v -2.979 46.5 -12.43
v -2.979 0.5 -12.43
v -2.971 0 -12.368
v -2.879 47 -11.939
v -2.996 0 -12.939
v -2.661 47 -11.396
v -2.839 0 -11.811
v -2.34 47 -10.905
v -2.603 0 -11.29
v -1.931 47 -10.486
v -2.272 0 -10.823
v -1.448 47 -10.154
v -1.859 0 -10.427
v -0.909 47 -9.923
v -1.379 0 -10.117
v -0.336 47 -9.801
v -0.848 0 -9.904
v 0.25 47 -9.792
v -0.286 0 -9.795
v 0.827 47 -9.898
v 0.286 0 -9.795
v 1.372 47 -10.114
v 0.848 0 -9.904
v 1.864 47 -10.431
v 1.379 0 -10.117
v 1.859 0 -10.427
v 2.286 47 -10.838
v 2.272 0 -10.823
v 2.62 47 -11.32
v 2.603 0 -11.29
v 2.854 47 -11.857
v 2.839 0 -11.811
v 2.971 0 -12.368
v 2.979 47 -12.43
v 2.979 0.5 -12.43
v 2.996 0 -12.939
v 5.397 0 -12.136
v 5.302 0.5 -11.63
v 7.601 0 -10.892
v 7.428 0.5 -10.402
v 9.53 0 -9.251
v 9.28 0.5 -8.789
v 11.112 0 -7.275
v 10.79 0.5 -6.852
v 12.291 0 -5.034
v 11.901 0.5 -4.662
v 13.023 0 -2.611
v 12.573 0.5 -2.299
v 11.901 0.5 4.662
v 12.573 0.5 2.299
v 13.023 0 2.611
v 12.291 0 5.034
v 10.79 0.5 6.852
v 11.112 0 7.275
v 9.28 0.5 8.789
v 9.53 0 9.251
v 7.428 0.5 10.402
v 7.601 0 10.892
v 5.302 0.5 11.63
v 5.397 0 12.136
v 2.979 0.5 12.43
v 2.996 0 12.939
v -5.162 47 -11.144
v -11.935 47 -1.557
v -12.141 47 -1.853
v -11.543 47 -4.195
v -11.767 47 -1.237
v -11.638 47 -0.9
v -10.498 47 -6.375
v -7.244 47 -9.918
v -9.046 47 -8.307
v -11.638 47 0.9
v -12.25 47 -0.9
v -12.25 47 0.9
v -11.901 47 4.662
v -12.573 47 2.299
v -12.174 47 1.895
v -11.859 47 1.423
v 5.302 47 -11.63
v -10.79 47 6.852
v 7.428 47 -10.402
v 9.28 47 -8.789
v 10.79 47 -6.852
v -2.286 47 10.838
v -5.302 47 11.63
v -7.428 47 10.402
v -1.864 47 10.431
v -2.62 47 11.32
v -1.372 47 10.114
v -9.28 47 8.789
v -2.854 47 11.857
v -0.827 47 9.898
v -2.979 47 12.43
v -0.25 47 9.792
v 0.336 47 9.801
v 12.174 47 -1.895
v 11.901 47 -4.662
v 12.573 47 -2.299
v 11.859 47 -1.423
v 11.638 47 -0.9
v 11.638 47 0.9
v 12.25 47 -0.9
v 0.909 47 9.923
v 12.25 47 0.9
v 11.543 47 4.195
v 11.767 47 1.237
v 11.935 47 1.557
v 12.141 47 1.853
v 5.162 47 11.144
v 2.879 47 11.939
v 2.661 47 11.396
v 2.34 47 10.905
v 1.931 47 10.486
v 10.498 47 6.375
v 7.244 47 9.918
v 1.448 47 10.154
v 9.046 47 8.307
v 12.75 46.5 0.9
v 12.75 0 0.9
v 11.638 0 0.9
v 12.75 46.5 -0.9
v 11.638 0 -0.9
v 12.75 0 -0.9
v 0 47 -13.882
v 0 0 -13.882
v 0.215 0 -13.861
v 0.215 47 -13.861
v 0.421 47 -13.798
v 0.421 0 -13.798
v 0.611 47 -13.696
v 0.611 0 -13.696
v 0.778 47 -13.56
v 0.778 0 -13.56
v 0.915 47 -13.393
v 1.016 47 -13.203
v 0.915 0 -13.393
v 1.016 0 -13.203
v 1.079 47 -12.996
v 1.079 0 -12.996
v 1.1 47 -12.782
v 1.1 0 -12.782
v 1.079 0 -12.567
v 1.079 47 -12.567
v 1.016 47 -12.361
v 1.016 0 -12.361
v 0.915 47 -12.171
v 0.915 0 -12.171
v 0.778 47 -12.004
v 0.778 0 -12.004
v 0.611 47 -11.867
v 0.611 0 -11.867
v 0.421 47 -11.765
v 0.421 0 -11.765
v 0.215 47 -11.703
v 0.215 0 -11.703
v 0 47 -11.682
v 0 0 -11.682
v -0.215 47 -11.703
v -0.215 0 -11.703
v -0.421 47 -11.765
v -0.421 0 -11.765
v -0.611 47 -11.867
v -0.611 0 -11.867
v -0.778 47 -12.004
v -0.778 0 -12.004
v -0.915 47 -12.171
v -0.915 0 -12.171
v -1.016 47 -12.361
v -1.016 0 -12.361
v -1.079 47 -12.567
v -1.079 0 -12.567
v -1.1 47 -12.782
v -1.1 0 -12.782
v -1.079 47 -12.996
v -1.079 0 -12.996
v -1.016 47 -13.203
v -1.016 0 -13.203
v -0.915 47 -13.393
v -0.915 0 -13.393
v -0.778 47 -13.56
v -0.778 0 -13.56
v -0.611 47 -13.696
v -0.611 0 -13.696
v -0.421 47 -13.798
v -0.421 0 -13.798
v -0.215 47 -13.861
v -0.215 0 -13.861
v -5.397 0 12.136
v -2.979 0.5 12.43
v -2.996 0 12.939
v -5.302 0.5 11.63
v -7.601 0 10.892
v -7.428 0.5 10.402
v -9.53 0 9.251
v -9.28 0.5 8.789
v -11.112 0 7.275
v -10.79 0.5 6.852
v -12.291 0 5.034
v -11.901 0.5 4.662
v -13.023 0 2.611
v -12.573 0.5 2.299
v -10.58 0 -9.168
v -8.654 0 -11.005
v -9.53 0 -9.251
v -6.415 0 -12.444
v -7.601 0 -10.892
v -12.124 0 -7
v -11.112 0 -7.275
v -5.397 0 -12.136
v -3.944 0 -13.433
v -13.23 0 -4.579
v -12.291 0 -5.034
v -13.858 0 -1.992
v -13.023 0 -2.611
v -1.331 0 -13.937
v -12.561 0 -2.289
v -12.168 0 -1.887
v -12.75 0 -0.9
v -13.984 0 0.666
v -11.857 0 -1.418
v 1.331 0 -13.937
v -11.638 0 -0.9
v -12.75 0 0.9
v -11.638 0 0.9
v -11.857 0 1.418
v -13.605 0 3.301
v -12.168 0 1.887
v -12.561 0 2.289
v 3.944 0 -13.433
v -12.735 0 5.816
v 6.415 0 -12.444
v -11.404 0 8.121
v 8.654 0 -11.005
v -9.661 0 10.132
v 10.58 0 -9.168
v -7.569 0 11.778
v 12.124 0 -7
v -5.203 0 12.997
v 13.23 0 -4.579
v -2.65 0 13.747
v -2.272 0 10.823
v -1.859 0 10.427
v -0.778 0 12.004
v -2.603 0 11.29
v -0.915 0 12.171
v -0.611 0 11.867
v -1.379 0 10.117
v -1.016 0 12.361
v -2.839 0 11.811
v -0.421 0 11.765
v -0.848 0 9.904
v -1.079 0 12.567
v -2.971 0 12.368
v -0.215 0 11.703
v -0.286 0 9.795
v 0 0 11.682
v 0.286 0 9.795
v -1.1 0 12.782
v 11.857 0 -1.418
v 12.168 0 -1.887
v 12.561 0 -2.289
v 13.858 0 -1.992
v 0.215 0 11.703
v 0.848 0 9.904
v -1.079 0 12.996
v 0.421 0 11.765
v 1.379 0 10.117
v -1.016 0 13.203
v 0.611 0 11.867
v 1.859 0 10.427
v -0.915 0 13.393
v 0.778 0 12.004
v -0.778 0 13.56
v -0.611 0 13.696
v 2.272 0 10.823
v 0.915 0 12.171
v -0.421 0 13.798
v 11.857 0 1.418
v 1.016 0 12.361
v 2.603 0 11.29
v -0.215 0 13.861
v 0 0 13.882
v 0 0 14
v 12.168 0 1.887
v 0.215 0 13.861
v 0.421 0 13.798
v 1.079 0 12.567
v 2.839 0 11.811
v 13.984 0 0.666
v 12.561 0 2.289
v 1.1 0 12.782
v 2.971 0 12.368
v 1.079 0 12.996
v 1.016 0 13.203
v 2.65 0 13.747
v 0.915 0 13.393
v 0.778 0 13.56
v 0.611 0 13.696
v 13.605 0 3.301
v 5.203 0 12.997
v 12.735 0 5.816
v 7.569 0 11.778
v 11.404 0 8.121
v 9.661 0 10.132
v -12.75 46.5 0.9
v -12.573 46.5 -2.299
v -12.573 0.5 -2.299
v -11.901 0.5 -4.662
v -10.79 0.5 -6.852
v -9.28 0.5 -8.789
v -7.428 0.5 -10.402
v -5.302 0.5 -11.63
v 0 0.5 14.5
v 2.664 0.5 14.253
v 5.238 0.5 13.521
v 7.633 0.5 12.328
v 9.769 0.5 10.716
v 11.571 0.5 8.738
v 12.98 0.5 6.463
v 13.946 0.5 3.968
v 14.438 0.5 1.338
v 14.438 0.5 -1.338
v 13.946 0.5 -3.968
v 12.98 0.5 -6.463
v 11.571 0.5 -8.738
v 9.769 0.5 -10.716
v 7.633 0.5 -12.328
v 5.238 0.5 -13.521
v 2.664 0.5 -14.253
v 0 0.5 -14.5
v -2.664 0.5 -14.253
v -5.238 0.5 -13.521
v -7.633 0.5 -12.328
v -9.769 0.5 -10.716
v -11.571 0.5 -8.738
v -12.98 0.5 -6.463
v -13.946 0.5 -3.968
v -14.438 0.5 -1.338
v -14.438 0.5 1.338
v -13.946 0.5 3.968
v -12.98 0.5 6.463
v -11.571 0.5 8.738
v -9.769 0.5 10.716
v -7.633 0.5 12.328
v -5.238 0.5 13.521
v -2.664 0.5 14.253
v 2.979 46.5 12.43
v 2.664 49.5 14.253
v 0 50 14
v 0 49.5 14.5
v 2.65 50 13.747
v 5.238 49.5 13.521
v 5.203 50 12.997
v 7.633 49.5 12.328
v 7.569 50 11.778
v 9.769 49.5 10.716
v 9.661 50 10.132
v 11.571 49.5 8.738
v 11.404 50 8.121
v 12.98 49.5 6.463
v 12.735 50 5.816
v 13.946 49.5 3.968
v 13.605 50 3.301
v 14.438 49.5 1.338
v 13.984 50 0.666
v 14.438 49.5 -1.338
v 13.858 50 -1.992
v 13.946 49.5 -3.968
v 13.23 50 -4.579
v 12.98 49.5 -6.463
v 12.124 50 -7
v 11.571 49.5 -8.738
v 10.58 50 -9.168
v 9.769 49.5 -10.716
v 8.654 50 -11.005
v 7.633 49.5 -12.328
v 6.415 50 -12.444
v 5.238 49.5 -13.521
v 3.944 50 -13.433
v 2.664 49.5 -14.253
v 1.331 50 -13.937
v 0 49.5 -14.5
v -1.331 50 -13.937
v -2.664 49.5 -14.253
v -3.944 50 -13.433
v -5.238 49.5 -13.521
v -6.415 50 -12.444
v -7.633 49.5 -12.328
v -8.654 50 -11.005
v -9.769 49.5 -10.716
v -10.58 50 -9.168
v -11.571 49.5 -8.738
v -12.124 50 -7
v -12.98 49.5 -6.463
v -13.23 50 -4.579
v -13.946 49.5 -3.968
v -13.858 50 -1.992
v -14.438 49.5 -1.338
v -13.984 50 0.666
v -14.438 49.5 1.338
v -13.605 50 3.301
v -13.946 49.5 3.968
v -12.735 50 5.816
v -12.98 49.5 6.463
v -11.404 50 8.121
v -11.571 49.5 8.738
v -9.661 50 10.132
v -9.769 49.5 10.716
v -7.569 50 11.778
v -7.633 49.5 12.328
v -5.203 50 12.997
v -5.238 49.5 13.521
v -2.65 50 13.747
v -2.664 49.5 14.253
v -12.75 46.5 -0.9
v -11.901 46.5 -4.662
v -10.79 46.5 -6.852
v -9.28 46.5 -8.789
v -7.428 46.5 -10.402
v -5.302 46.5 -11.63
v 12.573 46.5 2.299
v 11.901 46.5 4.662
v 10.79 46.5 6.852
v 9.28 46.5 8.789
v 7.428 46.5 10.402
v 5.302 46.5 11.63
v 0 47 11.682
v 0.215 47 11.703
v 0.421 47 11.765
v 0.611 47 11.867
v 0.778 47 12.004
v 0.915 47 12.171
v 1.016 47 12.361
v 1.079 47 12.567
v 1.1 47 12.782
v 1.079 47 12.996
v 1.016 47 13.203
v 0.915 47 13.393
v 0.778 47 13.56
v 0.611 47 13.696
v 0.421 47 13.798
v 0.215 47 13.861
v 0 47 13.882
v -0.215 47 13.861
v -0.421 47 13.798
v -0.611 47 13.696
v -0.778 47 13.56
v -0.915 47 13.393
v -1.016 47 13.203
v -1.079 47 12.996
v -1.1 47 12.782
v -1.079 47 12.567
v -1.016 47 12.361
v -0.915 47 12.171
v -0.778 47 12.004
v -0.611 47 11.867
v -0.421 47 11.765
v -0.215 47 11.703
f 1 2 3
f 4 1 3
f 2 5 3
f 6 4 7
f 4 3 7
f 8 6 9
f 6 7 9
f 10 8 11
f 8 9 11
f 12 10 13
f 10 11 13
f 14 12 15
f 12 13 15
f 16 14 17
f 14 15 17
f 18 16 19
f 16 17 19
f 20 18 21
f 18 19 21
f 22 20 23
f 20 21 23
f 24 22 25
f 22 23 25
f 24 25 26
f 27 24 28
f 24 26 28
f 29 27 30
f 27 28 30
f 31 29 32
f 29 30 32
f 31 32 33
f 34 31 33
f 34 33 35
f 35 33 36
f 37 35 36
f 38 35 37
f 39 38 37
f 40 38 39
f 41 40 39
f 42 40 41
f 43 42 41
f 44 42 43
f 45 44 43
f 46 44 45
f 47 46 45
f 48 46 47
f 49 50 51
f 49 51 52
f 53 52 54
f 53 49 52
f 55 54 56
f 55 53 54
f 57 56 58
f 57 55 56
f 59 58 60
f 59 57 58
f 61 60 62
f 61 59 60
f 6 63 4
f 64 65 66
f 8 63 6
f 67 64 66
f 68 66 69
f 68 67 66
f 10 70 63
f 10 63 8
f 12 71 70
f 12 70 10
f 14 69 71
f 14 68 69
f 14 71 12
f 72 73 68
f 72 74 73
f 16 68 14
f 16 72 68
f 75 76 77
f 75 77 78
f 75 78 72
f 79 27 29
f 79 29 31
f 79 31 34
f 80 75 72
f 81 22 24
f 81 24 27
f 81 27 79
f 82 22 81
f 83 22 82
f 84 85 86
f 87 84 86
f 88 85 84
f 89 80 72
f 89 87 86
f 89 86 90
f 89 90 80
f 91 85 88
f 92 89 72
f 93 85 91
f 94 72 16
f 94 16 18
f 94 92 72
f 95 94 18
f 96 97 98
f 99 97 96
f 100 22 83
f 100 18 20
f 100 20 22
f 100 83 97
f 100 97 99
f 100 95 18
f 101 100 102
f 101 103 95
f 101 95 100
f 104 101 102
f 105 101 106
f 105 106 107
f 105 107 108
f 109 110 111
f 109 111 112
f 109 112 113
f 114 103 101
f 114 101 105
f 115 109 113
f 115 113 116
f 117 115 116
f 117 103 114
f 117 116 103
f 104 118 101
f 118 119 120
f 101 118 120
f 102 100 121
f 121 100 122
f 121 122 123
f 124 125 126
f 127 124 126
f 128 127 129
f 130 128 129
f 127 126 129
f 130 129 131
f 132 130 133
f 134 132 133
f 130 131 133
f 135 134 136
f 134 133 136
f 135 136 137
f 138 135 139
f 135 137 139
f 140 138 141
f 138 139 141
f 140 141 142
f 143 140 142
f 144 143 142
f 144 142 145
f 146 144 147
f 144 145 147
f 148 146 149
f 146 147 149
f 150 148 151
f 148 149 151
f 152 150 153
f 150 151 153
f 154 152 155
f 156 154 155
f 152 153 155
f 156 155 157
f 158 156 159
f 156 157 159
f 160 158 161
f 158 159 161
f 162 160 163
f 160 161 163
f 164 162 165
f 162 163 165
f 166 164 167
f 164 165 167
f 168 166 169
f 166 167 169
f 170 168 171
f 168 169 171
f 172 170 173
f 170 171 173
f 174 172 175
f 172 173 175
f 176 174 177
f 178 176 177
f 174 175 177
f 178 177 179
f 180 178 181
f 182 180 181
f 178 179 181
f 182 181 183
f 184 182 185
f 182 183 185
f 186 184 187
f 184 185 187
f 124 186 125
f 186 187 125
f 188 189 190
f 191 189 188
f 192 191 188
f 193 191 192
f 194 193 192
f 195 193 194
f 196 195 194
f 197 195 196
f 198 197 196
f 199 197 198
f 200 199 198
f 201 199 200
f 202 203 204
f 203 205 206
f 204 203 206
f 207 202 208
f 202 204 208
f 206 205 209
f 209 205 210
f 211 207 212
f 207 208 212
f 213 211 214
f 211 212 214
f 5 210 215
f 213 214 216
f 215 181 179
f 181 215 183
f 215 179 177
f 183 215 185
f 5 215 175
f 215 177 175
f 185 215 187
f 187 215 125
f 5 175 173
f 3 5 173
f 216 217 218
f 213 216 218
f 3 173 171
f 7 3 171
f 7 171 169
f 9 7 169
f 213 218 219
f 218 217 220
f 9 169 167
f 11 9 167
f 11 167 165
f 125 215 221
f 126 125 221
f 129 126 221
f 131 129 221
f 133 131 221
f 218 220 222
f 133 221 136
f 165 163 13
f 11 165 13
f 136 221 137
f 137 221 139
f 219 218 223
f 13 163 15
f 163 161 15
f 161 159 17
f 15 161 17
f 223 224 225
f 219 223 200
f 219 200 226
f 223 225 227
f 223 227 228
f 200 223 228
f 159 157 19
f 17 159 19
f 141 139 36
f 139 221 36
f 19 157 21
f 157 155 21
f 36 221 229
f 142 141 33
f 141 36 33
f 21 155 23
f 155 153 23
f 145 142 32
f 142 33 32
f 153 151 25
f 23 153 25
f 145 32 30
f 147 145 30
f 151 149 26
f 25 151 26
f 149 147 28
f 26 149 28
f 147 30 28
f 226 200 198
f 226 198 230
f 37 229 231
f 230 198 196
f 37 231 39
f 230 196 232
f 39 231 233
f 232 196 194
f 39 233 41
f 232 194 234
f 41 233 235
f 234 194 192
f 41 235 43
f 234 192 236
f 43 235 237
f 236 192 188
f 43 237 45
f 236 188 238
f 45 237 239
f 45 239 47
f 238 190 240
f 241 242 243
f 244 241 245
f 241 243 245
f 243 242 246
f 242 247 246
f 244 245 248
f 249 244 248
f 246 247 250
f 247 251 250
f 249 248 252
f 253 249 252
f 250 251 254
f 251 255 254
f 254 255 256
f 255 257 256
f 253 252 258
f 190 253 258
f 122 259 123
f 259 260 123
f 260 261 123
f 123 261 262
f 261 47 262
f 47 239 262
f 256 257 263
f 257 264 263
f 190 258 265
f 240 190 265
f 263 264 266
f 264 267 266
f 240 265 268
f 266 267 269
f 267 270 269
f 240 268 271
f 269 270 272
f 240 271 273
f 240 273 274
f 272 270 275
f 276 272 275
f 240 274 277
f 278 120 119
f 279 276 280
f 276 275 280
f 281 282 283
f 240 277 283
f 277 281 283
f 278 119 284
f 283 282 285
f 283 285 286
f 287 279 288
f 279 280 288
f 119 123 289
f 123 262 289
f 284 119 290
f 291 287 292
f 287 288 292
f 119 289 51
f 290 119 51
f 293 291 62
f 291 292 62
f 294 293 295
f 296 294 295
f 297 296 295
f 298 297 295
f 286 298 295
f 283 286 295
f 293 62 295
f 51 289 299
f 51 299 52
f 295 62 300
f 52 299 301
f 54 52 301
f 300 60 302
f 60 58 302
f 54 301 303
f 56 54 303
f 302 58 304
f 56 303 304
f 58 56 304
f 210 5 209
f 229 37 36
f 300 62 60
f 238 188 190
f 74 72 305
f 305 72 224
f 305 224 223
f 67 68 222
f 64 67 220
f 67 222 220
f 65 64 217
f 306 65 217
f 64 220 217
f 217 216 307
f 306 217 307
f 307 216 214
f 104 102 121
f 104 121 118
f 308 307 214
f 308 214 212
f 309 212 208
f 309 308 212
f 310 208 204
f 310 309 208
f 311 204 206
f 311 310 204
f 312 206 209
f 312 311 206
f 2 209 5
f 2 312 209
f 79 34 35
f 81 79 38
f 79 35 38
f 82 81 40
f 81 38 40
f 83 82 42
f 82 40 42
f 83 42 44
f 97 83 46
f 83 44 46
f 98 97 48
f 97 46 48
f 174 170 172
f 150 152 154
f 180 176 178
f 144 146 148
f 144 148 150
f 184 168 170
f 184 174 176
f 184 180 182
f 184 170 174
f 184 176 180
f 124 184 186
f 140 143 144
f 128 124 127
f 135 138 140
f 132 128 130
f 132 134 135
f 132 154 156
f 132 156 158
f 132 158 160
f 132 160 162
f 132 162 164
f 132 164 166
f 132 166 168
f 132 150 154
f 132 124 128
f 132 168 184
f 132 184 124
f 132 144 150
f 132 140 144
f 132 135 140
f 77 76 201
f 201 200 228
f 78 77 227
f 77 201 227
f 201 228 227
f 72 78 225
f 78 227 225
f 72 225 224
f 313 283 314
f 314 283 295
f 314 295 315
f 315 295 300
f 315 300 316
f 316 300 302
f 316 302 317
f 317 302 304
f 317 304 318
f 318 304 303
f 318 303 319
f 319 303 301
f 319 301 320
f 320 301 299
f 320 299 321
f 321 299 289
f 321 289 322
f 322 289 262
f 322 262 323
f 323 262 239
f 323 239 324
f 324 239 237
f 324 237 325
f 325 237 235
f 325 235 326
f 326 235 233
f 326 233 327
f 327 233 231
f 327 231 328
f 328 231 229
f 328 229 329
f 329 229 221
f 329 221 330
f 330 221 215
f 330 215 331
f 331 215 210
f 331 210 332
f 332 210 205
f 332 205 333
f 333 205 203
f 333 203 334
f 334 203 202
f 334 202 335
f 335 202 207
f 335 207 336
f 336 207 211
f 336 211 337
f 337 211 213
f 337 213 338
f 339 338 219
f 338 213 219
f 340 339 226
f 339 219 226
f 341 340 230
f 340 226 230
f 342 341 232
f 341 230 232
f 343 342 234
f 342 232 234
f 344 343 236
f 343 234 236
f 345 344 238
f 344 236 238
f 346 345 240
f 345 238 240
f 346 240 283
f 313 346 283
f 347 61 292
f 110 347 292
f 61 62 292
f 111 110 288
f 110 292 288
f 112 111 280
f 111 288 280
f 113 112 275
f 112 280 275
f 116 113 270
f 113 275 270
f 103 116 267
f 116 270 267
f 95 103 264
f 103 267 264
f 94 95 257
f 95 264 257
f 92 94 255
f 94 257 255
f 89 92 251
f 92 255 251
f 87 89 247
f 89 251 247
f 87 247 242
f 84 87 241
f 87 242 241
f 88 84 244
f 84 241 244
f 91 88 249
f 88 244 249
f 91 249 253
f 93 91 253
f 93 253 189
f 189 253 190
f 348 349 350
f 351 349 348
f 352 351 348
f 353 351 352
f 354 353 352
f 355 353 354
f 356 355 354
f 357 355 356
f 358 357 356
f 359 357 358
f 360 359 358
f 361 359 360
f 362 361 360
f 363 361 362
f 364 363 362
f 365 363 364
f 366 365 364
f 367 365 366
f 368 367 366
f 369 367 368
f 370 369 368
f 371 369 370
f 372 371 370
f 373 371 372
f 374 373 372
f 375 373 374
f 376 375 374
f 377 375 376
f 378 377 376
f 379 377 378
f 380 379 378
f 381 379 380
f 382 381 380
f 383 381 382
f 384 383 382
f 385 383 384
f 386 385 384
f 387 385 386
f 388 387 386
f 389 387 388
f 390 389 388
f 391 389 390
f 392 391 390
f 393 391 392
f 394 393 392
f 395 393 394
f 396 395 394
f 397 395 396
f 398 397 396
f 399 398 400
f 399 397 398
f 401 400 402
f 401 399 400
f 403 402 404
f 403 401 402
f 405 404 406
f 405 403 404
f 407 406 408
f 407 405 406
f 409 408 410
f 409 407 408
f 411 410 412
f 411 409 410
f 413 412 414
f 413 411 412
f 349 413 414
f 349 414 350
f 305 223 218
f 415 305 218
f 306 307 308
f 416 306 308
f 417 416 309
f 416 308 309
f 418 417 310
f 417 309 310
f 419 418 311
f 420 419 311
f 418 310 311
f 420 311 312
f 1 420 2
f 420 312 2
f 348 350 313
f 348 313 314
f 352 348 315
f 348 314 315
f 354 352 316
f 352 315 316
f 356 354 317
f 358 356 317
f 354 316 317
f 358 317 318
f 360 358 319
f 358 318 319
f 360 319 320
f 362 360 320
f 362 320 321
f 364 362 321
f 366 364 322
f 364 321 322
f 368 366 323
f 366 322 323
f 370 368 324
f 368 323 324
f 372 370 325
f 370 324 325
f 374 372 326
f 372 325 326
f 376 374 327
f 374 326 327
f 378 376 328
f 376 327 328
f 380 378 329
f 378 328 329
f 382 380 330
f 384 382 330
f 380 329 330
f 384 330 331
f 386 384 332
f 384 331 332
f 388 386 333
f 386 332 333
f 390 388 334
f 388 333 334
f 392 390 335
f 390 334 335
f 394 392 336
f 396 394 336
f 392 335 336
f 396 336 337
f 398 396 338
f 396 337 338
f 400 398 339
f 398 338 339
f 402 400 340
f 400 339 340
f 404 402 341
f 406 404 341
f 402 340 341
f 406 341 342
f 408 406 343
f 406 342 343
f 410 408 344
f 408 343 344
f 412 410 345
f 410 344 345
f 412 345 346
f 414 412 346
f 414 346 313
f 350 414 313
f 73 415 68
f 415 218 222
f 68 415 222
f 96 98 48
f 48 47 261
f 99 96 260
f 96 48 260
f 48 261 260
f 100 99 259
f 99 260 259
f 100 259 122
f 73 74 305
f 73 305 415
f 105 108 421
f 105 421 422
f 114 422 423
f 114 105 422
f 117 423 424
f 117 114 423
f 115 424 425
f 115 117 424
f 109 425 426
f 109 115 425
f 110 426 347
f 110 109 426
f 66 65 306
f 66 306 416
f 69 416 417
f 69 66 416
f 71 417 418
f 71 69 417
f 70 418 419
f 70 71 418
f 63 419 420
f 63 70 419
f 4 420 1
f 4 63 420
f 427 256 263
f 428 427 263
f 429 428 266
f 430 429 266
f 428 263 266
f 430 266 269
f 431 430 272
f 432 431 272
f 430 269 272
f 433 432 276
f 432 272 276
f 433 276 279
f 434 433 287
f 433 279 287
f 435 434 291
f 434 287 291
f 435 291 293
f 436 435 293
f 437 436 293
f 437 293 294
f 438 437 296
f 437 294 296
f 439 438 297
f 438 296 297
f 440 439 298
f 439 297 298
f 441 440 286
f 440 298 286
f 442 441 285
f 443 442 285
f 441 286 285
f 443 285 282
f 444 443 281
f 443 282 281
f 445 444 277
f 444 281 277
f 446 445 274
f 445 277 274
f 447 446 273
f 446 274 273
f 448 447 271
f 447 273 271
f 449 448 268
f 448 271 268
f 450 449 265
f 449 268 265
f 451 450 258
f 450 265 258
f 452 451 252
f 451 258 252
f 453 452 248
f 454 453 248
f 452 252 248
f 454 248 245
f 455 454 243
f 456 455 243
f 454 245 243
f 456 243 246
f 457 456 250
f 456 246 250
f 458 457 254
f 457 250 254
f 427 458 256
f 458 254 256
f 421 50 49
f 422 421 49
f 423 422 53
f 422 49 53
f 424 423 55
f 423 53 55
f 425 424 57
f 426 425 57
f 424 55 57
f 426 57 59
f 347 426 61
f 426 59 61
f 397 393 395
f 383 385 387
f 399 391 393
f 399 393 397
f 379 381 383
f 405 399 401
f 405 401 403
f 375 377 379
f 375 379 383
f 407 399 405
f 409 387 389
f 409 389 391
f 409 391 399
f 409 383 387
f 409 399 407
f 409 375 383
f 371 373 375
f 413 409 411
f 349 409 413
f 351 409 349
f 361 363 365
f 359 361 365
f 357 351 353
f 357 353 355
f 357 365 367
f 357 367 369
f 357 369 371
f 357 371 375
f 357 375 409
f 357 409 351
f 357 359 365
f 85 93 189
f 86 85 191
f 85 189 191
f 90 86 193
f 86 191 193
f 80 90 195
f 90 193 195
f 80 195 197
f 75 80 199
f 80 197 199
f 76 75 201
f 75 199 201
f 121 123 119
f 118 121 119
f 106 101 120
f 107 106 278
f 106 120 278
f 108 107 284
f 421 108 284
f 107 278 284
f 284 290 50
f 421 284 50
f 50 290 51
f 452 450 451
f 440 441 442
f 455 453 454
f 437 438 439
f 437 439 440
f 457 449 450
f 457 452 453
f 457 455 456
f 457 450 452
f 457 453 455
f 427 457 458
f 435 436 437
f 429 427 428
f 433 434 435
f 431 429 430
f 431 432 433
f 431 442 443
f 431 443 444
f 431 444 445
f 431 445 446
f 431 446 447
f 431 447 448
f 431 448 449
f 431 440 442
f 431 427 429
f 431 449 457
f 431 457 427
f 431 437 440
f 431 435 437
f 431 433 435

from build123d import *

# Parameters (mm, degrees)
SKETCH1_R           = 14.5
BOSS_EXTRUDE1_DEPTH = 50
SKETCH2_R           = 1.1
CUT_EXTRUDE1_DEPTH  = 47
CHAMFER1_SIZE       = 0.5


with BuildPart() as part:
    # Sketch1 → Boss-Extrude1 (new body)
    with BuildSketch(Plane(origin=(0, 0, 0), x_dir=(1, 0, 0), z_dir=(0, 1, 0))):
        with Locations(Location((0, 0, 0), (0, 0, 270))):
            Circle(SKETCH1_R)
    extrude(amount=BOSS_EXTRUDE1_DEPTH)

    # Sketch2 → Cut-Extrude1 (cut)
    with BuildSketch(Plane.XZ):
        with BuildLine():
            Line((-12.75, 0.9), (-12.75, -0.9))
            Line((-12.75, -0.9), (-11.638182396, -0.9))
            ThreePointArc((-11.638182396, -0.9), (-12.005537317, -1.66663011), (-12.573189655, -2.299435125))
            ThreePointArc((-12.573189655, -2.299435125), (-9.280361808, -8.789049136), (-2.979270067, -12.429660087))
            ThreePointArc((-2.979270067, -12.429660087), (0, -9.781725236), (2.979270067, -12.429660087))
            ThreePointArc((2.979270067, -12.429660087), (9.280361808, -8.789049136), (12.573189655, -2.299435125))
            ThreePointArc((12.573189655, -2.299435125), (12.005537317, -1.66663011), (11.638182396, -0.9))
            Line((11.638182396, -0.9), (12.75, -0.9))
            Line((12.75, -0.9), (12.75, 0.9))
            Line((12.75, 0.9), (11.638182396, 0.9))
            ThreePointArc((11.638182396, 0.9), (12.005537317, 1.66663011), (12.573189655, 2.299435125))
            ThreePointArc((12.573189655, 2.299435125), (9.280361808, 8.789049136), (2.979270067, 12.429660087))
            ThreePointArc((2.979270067, 12.429660087), (0, 9.781725236), (-2.979270067, 12.429660087))
            ThreePointArc((-2.979270067, 12.429660087), (-9.280361808, 8.789049136), (-12.573189655, 2.299435125))
            ThreePointArc((-12.573189655, 2.299435125), (-12.005537317, 1.66663011), (-11.638182396, 0.9))
            Line((-11.638182396, 0.9), (-12.75, 0.9))
        make_face()
        with Locations(Location((0, -12.781725236, 0), (0, 0, 270))):
            Circle(SKETCH2_R)
        with Locations(Location((0, 12.781725236, 0), (0, 0, 270))):
            Circle(SKETCH2_R)
    extrude(amount=-CUT_EXTRUDE1_DEPTH, mode=Mode.SUBTRACT)

    # Chamfer1
    chamfer1_edges = [part.edges().sort_by_distance(p)[0] for p in [
        (9.280361808, 47, 8.789049136),
        (0, 0, -14.5),
        (12.75, 47, 0),
        (-9.280361808, 47, -8.789049136),
        (-12.75, 47, 0),
        (-9.280361808, 0, -8.789049136),
        (9.280361808, 0, -8.789049136),
        (9.280361808, 0, 8.789049136),
        (-9.280361808, 0, 8.789049136),
        (0, 50, -14.5),
    ]]
    chamfer(chamfer1_edges, length=CHAMFER1_SIZE)


solid = part.part
